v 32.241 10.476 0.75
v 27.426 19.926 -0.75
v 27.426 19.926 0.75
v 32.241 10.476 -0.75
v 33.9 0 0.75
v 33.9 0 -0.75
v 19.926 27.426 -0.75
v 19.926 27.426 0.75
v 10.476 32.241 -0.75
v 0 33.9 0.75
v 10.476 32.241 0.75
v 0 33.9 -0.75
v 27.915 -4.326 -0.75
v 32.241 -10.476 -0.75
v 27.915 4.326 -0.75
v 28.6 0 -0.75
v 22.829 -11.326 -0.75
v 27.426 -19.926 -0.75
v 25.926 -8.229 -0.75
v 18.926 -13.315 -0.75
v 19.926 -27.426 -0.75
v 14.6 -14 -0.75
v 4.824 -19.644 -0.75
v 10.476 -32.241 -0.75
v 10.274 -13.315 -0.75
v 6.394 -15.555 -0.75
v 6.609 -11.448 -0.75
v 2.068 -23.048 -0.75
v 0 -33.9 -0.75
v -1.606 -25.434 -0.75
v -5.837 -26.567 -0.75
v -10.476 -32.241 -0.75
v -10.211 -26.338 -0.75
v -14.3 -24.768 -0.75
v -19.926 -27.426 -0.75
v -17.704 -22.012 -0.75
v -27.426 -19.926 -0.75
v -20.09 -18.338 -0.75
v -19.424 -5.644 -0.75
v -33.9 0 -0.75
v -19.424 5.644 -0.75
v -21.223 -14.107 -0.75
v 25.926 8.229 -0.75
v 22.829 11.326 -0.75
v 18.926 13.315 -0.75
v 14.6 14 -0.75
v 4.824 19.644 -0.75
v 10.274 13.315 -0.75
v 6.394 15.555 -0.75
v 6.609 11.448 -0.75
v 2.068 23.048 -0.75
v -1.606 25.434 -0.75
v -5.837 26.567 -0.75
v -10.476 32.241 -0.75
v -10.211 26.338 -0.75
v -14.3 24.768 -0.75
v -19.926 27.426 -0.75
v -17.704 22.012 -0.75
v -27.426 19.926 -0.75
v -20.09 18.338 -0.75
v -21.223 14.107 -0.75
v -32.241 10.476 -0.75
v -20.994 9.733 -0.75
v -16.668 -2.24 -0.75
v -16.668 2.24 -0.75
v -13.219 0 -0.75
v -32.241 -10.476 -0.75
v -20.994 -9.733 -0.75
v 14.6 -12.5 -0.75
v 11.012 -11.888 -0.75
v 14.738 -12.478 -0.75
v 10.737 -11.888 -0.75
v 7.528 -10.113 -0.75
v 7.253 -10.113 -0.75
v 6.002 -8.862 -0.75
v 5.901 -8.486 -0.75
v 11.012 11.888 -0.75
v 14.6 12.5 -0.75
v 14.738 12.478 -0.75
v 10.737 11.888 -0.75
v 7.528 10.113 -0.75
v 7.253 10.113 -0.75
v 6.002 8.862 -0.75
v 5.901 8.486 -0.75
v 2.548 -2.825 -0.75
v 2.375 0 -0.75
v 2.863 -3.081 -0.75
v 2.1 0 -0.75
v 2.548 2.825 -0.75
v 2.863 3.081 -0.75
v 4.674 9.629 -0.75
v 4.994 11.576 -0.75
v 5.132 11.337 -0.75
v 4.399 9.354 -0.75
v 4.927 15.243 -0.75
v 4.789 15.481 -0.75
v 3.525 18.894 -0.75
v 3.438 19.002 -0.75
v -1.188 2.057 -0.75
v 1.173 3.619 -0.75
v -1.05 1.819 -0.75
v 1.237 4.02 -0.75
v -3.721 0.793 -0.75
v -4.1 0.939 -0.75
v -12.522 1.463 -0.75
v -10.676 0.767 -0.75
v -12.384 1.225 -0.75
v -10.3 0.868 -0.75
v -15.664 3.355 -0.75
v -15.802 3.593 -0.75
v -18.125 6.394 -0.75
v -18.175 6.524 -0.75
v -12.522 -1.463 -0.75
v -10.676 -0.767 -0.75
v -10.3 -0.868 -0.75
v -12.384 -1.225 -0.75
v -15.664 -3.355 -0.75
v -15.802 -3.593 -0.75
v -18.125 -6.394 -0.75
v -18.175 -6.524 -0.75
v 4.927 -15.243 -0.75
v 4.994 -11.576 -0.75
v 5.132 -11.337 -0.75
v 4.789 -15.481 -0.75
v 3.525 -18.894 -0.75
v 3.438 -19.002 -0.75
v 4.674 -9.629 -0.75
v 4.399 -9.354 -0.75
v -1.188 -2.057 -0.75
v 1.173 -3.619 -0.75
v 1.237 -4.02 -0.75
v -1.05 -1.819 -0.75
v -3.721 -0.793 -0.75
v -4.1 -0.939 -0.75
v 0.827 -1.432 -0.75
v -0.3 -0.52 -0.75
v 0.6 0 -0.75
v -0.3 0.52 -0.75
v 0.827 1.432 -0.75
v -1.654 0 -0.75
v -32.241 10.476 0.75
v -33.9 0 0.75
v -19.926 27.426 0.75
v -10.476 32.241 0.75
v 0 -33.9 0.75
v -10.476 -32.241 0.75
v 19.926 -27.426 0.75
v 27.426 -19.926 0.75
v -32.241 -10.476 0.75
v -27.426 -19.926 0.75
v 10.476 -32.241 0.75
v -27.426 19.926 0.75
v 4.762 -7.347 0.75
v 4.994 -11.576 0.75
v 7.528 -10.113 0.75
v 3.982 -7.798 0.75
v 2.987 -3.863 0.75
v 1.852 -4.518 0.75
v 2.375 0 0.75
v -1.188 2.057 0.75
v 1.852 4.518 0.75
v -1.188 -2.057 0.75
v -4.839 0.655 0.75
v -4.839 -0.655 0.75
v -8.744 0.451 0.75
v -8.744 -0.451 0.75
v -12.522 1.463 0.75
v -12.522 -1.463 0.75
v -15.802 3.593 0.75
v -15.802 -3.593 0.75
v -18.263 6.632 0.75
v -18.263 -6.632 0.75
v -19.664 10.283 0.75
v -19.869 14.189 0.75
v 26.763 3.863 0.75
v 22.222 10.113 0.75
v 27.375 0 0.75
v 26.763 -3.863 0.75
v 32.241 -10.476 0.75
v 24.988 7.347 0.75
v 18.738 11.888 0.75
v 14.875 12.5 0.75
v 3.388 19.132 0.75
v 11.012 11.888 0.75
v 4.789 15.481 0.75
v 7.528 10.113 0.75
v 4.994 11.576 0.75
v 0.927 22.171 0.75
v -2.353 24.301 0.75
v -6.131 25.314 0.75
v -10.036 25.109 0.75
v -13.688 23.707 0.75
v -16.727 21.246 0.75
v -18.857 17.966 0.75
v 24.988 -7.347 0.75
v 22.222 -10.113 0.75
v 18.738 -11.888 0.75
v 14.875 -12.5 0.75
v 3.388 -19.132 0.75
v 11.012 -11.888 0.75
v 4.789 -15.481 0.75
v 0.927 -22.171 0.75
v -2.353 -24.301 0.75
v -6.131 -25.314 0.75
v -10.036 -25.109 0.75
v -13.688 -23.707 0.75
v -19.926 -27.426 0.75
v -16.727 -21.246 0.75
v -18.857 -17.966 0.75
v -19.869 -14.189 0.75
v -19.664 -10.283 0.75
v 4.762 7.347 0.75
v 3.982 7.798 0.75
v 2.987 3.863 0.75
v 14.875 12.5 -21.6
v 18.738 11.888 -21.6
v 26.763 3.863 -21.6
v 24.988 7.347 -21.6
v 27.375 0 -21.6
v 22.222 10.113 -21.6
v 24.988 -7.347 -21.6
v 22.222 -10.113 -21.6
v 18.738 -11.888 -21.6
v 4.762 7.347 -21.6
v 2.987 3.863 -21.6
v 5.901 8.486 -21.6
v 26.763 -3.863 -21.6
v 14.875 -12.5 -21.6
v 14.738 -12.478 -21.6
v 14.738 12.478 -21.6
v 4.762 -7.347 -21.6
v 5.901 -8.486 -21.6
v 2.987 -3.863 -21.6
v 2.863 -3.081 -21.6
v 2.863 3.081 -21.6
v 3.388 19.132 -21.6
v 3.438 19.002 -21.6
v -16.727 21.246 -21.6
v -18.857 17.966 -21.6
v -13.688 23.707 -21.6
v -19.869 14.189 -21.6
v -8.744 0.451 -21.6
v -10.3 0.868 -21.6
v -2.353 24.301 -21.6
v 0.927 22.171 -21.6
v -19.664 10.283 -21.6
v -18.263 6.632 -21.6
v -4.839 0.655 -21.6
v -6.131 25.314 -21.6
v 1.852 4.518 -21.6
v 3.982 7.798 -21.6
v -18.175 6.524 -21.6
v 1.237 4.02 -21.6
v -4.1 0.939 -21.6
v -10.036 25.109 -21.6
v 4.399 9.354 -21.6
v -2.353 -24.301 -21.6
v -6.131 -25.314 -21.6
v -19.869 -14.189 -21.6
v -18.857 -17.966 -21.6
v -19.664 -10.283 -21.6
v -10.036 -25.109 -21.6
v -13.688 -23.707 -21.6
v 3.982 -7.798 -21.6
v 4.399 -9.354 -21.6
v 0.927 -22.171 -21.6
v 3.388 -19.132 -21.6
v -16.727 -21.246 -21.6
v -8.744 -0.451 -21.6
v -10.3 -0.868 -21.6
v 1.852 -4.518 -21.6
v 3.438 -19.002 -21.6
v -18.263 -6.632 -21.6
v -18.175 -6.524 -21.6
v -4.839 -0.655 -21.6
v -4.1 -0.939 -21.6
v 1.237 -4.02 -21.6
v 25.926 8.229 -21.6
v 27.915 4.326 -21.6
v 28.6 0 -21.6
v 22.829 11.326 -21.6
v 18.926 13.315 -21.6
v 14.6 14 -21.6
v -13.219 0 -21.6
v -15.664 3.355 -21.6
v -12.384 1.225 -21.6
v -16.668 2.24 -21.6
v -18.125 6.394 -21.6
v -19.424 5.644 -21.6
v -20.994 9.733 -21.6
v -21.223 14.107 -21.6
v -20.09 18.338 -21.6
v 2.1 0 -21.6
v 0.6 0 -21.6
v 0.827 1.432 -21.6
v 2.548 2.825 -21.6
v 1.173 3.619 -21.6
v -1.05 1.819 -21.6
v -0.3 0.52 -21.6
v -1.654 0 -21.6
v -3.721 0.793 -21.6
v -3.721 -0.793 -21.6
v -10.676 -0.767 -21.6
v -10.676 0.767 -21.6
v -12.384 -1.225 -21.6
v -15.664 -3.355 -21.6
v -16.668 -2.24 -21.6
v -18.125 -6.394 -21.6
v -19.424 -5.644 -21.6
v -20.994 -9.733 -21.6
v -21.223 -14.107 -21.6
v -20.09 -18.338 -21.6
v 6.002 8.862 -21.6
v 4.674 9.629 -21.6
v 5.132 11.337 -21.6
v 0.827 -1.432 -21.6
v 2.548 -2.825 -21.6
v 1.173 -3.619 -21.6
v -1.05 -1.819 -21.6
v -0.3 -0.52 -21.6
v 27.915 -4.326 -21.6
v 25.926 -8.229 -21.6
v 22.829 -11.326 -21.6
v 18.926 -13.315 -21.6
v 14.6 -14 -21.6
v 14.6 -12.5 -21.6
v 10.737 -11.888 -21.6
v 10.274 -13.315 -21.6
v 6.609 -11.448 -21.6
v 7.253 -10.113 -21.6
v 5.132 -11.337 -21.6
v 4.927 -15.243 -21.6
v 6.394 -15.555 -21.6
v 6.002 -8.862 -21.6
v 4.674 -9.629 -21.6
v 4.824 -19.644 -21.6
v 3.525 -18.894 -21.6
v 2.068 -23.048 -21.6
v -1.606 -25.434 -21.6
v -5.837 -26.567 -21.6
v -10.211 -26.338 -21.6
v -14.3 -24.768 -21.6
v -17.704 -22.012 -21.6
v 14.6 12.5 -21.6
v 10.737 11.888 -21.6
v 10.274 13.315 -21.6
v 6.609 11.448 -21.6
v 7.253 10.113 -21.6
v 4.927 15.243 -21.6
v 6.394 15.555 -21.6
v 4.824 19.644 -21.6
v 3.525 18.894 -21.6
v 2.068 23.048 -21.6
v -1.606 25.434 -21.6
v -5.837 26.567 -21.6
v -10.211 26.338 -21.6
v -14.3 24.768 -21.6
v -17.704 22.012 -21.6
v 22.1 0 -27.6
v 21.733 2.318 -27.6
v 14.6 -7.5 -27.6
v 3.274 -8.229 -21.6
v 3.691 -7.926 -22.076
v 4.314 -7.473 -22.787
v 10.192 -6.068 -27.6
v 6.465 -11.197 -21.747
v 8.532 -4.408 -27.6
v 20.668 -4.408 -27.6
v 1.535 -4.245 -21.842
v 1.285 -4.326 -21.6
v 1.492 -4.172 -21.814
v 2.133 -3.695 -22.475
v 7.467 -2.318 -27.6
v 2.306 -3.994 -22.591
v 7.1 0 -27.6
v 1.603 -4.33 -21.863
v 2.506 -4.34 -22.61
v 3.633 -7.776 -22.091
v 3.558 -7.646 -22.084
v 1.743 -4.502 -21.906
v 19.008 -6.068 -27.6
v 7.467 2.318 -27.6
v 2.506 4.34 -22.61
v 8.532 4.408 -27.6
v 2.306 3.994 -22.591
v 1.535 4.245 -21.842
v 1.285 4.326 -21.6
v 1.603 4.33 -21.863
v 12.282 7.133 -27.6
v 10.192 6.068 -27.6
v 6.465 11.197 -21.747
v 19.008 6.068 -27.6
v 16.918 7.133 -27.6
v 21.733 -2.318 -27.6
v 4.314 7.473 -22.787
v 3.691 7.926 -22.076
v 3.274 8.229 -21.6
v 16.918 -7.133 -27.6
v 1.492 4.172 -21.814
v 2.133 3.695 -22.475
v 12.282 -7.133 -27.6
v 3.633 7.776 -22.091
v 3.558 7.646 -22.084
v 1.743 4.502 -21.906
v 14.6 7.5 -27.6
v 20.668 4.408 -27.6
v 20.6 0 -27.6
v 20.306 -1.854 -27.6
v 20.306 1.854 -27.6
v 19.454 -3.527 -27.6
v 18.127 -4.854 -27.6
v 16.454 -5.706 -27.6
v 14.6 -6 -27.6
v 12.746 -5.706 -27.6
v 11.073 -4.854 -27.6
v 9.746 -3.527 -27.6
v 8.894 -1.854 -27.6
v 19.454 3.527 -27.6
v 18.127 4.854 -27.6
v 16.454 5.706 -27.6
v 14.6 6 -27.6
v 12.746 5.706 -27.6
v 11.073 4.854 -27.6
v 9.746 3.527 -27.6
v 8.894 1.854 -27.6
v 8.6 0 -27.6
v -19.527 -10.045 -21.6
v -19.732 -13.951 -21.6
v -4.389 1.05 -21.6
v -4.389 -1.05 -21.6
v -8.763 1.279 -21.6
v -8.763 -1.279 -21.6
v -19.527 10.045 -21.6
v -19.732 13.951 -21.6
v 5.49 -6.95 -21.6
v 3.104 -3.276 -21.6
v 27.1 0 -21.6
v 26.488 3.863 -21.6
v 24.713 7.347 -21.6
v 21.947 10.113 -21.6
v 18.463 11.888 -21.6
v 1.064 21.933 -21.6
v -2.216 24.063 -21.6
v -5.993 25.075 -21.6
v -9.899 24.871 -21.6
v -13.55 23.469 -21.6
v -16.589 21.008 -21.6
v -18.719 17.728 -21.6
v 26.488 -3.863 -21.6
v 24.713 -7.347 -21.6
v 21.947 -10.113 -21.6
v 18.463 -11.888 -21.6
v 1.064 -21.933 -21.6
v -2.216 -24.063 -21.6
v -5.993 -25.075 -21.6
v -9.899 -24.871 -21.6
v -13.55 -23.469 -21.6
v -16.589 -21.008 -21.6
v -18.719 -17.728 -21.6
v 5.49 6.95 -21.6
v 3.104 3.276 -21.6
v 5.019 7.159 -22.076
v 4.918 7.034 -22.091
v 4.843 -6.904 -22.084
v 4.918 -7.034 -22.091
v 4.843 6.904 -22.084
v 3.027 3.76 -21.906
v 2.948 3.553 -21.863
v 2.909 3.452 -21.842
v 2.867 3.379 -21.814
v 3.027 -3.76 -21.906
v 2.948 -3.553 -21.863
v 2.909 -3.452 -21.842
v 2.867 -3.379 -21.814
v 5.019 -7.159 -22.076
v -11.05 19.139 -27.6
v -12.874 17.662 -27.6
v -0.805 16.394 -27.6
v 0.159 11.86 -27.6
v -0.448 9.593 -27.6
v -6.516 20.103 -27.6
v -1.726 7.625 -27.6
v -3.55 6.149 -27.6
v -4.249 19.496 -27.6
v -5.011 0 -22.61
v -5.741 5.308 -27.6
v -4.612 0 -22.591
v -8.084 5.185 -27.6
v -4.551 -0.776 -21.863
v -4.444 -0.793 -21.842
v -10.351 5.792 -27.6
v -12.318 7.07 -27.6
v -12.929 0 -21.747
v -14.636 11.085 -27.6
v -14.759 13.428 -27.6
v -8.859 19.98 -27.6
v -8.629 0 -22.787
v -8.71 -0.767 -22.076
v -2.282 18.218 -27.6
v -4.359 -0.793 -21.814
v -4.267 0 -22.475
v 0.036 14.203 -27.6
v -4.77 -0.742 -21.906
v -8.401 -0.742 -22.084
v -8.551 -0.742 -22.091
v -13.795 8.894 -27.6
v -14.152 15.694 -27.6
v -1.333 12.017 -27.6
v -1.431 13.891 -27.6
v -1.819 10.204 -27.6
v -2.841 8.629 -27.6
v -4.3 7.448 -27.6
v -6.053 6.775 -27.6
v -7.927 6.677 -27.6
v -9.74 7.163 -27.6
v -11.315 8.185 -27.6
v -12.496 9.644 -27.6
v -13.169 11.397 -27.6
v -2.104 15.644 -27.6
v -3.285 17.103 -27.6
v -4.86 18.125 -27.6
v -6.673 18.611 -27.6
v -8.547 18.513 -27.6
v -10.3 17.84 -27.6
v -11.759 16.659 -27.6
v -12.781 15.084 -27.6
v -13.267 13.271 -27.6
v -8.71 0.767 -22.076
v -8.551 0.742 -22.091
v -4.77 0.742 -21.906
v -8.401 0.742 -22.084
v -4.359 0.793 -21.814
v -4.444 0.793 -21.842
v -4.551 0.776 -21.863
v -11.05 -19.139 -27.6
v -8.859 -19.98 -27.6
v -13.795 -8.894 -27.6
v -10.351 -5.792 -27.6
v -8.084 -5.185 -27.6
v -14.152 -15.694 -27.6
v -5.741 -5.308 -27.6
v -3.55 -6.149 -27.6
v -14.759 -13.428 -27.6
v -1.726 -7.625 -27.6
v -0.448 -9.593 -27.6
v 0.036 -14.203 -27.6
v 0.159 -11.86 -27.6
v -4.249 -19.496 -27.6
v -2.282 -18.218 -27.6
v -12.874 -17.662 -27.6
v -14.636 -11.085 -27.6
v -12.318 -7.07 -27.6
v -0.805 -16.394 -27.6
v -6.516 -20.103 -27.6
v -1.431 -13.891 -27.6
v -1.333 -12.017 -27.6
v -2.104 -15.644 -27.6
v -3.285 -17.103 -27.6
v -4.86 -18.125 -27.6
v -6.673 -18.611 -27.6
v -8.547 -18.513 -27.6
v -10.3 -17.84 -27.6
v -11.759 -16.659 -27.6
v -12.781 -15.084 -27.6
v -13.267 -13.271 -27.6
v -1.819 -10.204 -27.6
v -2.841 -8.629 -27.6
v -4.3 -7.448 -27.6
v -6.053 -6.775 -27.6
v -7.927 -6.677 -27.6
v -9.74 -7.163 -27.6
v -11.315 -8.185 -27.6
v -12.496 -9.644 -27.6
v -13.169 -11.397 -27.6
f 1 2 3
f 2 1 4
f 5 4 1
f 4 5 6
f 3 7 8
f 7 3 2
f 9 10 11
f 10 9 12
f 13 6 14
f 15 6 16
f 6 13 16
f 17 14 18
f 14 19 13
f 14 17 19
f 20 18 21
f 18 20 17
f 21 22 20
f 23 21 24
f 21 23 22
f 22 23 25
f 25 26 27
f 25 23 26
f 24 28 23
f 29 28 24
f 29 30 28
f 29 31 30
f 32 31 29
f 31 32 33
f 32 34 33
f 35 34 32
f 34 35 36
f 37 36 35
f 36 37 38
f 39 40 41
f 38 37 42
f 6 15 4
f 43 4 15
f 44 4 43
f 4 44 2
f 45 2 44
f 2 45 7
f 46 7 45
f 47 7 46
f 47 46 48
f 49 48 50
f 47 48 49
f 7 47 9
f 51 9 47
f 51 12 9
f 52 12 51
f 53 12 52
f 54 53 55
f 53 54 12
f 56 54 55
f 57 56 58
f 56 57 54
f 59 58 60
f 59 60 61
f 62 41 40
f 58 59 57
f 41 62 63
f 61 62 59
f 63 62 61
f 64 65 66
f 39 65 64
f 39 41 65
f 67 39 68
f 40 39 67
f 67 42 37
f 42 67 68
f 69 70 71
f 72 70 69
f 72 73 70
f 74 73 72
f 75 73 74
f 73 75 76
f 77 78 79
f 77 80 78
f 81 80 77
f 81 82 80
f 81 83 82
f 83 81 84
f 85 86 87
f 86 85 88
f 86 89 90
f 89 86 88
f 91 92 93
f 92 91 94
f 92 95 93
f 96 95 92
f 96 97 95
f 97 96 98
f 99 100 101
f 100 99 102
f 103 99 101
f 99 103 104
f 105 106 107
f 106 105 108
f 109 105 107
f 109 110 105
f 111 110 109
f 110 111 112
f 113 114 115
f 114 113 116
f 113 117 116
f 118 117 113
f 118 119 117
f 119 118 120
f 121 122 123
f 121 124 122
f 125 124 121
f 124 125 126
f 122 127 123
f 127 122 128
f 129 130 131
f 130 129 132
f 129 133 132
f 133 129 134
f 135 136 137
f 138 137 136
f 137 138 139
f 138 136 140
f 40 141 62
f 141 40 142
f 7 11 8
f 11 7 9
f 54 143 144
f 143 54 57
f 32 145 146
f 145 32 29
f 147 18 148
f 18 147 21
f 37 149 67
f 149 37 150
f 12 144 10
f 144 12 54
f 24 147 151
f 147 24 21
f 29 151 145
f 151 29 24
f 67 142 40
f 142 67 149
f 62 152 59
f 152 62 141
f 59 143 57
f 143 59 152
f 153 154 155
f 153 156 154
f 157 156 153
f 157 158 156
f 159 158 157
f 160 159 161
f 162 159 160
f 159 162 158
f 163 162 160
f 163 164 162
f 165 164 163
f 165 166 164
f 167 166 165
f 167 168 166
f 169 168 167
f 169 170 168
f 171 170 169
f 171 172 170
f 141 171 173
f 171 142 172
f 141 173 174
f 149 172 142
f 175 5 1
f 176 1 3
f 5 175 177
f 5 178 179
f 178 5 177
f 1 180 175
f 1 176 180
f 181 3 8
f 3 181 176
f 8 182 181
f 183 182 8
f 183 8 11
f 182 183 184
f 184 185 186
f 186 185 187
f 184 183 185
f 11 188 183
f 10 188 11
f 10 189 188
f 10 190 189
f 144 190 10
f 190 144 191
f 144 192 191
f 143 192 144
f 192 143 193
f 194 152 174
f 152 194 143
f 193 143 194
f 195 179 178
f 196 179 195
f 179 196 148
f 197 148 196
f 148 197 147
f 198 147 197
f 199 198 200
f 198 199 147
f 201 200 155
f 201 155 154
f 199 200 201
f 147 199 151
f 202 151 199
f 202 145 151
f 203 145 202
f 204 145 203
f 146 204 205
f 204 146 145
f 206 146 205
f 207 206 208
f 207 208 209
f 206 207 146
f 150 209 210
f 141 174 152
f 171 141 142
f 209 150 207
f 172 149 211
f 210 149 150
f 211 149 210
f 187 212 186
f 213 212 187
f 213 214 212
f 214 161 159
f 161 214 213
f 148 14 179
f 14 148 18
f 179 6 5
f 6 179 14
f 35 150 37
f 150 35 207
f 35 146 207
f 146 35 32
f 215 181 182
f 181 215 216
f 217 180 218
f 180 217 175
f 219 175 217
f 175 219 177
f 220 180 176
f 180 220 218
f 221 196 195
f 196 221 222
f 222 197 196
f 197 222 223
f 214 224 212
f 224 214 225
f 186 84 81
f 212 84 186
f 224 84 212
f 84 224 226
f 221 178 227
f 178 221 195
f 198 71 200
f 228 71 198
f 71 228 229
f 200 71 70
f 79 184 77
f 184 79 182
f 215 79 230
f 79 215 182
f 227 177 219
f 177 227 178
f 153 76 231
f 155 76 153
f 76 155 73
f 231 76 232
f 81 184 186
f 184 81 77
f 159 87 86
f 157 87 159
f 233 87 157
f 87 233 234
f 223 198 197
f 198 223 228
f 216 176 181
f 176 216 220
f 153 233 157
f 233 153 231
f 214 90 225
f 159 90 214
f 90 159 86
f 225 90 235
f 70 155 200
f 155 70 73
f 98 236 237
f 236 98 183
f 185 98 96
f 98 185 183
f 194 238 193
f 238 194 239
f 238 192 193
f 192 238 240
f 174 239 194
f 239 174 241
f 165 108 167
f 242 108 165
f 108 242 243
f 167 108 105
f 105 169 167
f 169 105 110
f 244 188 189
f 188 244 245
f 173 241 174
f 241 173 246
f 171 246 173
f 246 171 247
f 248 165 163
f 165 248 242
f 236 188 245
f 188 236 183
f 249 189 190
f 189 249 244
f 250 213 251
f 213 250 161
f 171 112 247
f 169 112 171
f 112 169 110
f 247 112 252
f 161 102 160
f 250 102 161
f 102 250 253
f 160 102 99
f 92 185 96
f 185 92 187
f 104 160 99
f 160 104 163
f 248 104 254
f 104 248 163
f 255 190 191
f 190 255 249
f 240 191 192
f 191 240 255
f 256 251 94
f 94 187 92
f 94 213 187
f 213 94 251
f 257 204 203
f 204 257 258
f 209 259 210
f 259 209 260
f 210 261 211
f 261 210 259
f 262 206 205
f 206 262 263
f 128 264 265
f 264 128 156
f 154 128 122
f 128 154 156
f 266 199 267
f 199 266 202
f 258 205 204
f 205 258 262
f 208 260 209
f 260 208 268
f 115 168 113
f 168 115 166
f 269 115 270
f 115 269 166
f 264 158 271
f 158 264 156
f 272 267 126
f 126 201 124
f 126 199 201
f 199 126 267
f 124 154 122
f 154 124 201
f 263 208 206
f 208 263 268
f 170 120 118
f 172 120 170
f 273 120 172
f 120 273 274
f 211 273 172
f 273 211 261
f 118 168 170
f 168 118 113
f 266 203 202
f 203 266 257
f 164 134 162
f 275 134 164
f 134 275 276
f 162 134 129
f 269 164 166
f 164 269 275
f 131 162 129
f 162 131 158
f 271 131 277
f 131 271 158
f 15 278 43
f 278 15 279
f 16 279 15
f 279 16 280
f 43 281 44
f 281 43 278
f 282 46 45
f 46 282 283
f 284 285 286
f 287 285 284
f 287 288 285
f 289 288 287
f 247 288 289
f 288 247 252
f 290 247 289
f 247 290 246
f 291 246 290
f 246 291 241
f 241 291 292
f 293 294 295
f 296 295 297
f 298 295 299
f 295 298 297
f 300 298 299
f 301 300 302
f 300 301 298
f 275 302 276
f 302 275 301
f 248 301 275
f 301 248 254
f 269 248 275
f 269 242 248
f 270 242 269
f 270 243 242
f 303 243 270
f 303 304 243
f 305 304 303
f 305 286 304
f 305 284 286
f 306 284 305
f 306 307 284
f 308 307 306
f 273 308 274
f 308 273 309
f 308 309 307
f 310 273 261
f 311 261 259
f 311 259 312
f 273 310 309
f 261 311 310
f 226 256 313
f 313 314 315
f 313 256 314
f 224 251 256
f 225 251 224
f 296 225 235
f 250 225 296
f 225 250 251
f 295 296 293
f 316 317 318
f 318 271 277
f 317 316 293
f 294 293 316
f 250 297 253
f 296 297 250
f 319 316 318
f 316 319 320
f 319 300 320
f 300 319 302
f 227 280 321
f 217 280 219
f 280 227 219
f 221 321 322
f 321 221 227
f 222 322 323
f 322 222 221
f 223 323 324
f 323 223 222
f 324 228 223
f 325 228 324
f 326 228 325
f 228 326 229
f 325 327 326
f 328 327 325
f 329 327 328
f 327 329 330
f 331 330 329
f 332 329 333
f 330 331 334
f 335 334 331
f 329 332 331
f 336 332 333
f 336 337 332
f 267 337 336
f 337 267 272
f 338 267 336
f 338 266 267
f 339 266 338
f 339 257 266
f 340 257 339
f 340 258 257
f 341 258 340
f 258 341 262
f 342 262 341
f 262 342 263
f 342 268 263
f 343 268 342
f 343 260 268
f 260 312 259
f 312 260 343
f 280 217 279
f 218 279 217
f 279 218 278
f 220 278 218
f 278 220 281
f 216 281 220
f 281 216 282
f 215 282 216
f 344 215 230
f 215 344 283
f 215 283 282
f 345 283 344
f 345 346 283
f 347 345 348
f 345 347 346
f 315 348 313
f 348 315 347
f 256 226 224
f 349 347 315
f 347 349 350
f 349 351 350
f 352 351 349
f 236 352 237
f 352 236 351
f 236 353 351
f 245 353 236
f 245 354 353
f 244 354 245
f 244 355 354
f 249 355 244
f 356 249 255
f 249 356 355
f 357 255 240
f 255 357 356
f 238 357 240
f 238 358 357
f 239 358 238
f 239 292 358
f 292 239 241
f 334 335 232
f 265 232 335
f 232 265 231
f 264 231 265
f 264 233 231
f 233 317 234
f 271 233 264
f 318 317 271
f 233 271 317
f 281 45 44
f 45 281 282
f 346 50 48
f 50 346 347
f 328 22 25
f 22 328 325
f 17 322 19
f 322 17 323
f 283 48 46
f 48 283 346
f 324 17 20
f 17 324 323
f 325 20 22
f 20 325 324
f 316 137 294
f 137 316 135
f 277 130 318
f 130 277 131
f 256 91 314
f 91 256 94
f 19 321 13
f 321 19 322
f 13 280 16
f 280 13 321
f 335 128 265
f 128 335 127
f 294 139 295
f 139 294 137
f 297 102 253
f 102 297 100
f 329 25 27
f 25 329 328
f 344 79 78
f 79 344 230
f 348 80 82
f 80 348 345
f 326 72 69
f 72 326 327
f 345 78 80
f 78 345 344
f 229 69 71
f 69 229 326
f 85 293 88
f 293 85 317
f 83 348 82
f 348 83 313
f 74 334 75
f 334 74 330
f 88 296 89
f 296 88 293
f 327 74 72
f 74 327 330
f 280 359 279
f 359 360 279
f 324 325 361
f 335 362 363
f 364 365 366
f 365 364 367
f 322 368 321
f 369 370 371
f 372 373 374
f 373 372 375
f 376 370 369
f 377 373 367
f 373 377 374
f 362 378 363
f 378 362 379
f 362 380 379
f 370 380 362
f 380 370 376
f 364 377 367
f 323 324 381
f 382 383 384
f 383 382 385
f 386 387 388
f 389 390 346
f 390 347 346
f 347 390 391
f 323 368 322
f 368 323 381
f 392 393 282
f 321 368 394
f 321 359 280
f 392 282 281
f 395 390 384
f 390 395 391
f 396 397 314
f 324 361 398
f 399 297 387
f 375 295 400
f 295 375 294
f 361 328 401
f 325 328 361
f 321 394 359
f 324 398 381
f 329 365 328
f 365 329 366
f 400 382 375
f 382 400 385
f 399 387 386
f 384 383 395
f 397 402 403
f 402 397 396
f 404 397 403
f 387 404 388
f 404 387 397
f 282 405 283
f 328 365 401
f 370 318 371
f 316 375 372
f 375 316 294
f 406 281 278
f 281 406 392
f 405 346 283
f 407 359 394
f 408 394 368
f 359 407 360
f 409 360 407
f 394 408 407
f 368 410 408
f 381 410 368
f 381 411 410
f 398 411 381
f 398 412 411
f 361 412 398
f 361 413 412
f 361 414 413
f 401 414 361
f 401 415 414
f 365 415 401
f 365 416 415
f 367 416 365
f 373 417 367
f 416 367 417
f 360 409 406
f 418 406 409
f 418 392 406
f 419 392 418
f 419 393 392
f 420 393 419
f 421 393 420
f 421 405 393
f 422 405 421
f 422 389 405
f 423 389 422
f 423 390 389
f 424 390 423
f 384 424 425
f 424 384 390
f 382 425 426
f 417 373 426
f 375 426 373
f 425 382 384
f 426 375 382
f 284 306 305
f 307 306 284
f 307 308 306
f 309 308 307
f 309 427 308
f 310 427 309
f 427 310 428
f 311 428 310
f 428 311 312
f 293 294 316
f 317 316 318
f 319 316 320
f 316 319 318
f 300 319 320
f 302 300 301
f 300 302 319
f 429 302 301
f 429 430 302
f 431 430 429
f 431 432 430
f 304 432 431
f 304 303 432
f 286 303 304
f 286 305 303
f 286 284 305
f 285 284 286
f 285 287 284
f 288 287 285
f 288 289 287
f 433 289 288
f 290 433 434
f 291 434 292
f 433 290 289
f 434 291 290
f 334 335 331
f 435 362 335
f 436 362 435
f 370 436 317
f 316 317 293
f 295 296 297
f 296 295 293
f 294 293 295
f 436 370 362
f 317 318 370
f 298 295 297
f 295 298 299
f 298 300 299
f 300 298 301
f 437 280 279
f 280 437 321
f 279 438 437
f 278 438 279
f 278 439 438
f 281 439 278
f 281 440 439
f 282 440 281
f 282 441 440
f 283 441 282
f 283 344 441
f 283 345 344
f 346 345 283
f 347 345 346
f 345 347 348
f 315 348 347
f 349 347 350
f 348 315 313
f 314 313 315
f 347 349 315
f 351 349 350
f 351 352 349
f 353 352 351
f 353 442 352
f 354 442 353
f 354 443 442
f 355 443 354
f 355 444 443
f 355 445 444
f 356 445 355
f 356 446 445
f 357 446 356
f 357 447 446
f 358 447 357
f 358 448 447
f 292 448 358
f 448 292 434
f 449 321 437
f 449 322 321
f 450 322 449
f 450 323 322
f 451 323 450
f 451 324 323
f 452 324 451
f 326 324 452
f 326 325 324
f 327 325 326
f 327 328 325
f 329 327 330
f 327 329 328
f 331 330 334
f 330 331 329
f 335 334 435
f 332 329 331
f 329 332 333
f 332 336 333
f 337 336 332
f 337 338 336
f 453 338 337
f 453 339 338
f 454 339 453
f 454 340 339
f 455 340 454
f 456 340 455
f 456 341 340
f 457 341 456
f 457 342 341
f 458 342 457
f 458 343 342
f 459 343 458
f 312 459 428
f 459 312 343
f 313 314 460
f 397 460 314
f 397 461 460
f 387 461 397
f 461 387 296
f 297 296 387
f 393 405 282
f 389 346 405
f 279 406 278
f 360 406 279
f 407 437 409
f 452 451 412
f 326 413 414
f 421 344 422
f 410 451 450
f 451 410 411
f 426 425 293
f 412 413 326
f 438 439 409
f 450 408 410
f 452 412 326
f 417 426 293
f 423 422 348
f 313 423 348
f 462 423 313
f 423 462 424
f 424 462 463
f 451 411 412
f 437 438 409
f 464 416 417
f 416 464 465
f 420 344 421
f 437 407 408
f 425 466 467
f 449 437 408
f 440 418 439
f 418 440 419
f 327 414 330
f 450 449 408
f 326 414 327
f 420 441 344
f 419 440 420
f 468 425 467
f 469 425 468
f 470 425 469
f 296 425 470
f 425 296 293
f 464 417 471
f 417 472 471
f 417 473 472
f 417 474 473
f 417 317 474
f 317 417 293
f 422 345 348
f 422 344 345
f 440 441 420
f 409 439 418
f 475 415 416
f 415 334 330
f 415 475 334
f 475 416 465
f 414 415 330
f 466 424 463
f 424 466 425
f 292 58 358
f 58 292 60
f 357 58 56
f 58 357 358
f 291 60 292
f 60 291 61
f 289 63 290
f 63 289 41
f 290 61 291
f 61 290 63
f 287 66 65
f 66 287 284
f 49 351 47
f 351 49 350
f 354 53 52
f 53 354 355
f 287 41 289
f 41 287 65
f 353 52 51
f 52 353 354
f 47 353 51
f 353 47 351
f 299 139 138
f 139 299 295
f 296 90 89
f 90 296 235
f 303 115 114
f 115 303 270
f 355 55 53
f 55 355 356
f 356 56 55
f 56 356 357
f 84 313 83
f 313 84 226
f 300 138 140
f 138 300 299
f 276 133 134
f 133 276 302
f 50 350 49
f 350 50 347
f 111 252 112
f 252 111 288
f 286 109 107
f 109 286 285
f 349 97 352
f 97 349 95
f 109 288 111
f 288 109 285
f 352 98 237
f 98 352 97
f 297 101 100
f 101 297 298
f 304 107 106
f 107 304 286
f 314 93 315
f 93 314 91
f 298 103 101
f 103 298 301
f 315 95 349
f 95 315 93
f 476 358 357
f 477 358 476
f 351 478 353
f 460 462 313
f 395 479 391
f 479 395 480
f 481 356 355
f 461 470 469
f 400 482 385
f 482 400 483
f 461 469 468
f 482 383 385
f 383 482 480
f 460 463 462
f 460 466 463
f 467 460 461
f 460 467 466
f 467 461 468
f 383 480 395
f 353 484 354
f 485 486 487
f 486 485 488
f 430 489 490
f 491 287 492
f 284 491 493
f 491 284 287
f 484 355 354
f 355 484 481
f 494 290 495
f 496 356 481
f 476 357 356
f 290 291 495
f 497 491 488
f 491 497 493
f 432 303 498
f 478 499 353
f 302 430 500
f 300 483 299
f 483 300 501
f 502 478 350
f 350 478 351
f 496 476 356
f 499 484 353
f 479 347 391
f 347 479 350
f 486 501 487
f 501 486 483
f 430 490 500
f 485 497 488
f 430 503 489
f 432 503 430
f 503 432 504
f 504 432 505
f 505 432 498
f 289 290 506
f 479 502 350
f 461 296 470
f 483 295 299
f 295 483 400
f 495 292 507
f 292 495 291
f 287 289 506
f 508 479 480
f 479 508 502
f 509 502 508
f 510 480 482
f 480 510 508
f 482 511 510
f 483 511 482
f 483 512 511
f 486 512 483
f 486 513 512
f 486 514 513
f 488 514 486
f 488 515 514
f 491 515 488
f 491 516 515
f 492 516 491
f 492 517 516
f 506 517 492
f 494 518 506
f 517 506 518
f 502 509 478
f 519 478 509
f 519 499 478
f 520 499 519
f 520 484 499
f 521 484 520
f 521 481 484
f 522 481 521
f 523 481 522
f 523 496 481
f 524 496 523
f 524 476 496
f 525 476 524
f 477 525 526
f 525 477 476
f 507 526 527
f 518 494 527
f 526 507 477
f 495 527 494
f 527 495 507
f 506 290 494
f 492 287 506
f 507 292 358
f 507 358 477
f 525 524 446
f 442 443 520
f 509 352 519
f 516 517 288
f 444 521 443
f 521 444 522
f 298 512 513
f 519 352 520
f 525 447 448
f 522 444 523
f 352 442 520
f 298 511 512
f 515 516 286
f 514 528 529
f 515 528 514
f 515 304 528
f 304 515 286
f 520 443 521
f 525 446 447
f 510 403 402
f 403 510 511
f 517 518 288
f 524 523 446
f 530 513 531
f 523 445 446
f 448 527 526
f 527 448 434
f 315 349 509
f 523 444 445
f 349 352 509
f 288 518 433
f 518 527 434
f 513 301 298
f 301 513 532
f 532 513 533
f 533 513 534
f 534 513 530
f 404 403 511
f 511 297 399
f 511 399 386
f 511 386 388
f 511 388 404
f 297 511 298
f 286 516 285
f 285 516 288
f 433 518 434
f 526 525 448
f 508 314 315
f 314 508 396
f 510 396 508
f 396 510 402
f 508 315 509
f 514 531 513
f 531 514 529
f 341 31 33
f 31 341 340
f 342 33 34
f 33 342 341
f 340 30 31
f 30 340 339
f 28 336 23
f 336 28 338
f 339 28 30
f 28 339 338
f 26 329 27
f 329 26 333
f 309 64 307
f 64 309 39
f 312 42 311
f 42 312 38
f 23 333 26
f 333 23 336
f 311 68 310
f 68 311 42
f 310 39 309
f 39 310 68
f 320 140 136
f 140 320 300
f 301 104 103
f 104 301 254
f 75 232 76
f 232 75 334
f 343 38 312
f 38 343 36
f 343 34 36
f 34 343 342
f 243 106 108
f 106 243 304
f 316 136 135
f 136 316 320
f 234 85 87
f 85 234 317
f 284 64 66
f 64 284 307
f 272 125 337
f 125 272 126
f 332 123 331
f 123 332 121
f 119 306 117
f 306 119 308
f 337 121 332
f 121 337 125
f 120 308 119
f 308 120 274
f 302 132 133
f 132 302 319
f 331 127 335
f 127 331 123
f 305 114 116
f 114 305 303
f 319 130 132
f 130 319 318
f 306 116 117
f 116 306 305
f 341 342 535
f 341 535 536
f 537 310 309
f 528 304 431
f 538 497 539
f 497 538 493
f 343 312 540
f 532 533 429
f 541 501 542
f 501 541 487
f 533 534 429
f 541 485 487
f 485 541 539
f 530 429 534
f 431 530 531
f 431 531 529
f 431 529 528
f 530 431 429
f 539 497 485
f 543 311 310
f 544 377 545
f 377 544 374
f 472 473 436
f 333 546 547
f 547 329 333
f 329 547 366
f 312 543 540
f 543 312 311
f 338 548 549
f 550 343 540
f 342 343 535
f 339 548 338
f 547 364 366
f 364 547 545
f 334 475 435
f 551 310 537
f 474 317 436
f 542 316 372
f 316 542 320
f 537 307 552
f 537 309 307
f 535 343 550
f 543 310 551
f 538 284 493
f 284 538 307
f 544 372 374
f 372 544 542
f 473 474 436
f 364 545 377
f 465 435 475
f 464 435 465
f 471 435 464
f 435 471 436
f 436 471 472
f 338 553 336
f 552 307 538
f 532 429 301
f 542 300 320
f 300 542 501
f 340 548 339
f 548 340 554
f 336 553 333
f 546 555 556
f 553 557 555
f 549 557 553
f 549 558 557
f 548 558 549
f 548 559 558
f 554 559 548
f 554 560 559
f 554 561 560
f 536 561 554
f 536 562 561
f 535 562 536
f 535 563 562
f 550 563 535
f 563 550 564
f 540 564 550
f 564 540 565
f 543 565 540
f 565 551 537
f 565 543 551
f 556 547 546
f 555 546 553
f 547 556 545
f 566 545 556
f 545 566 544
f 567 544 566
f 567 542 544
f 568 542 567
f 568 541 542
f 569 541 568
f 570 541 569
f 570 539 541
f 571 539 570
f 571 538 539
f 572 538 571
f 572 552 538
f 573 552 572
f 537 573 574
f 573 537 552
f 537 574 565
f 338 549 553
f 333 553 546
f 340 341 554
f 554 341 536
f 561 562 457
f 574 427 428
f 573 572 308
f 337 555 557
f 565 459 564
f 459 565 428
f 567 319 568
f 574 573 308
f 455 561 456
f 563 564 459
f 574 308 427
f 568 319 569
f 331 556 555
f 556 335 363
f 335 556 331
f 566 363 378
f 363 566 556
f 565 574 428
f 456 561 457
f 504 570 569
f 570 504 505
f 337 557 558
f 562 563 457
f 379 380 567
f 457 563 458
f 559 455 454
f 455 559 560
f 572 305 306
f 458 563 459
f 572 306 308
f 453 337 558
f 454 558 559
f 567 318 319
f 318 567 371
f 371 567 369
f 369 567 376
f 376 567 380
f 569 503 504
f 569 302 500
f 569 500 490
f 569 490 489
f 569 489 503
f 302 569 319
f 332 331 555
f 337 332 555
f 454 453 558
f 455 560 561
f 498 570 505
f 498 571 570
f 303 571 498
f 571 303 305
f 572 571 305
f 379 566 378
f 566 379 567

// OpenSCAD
$fn=20;     // =20 for preview, =200 for rendering/printing
id=57.5;    // Inner Diameter (at least 56.75)
ed=67.8;    // Exterior Diameter (>= id)


//cylinder(h = 30, d =70, center = true);
//translate([0, 0, -10.8]) color([1,0,0]) cylinder(h = 23.1, d = 4.5, center = true); // fill the hole!!
shift=(id-28.3)/2;
difference() {
    group() {
        difference() {
            cylinder(h = 1.5, d = ed, center = true);
            rotate (0) translate([14.875, 0,0]) cylinder(h = 1.5, d = 25, center = true);
            rotate (120) translate([14.875, 0, 0]) cylinder(h = 1.5, d = 25, center = true);
            rotate (240) translate([14.875, 0, 0]) cylinder(h = 1.5, d = 25, center = true);
        }

    rotate(0) translate([shift, 0, -10.8]) {
    difference() {
        color([1,0,0]) cylinder(h = 21.6, d = 28, center = true);
        translate([0, 0, 0]) {
            color([0,1,0]) cylinder(h = 21.6, d = 25, center = true);
        }
        translate([0, 0, 1.5]) {
            color([0,0,1]) cylinder(h = 40, d = 15, center = true);
        }
    }
    color([1,1,1]) translate([0, 0, -13.8]) {
        difference() {
            cylinder(h=6, r1=7.5, r2=14, center=true);
            cylinder(h=6, r1=6, r2=12.5, center=true);
        }
    }
    }

    rotate(120) translate([shift, 0, -10.8]) {
    difference() {
        color([1,0,0]) cylinder(h = 21.6, d = 28, center = true);
        translate([0, 0, 0]) {
            color([0,1,0]) cylinder(h = 21.6, d = 25, center = true);
        }
        translate([0, 0, 1.5]) {
            color([0,0,1]) cylinder(h = 40, d = 15, center = true);
        }
    }
    color([1,1,1]) translate([0, 0, -13.8]) {
        difference() {
            cylinder(h=6, r1=7.5, r2=14, center=true);
            cylinder(h=6, r1=6, r2=12.5, center=true);
        }
    }
    }

    rotate(240) translate([shift, 0, -10.8]) {
    difference() {
        color([1,0,0]) cylinder(h = 21.6, d = 28, center = true);
        translate([0, 0, 0]) {
            color([0,1,0]) cylinder(h = 21.6, d = 25, center = true);
        }
        translate([0, 0, 1.5]) {
            color([0,0,1]) cylinder(h = 40, d = 15, center = true);
        }
    }
    color([1,1,1]) translate([0, 0, -13.8]) {
        difference() {
            cylinder(h=6, r1=7.5, r2=14, center=true);
            cylinder(h=6, r1=6, r2=12.5, center=true);
        }
    }
    }
    }
    rotate (0)   translate([shift+0.275, 0, -10.8])  cylinder(h = 21.6, d = 25, center = true);
    rotate (120) translate([shift+0.275, 0, -10.8]) cylinder(h = 21.6, d = 25, center = true);
    rotate (240) translate([shift+0.275, 0, -10.8]) cylinder(h = 21.6, d = 25, center = true);
}
